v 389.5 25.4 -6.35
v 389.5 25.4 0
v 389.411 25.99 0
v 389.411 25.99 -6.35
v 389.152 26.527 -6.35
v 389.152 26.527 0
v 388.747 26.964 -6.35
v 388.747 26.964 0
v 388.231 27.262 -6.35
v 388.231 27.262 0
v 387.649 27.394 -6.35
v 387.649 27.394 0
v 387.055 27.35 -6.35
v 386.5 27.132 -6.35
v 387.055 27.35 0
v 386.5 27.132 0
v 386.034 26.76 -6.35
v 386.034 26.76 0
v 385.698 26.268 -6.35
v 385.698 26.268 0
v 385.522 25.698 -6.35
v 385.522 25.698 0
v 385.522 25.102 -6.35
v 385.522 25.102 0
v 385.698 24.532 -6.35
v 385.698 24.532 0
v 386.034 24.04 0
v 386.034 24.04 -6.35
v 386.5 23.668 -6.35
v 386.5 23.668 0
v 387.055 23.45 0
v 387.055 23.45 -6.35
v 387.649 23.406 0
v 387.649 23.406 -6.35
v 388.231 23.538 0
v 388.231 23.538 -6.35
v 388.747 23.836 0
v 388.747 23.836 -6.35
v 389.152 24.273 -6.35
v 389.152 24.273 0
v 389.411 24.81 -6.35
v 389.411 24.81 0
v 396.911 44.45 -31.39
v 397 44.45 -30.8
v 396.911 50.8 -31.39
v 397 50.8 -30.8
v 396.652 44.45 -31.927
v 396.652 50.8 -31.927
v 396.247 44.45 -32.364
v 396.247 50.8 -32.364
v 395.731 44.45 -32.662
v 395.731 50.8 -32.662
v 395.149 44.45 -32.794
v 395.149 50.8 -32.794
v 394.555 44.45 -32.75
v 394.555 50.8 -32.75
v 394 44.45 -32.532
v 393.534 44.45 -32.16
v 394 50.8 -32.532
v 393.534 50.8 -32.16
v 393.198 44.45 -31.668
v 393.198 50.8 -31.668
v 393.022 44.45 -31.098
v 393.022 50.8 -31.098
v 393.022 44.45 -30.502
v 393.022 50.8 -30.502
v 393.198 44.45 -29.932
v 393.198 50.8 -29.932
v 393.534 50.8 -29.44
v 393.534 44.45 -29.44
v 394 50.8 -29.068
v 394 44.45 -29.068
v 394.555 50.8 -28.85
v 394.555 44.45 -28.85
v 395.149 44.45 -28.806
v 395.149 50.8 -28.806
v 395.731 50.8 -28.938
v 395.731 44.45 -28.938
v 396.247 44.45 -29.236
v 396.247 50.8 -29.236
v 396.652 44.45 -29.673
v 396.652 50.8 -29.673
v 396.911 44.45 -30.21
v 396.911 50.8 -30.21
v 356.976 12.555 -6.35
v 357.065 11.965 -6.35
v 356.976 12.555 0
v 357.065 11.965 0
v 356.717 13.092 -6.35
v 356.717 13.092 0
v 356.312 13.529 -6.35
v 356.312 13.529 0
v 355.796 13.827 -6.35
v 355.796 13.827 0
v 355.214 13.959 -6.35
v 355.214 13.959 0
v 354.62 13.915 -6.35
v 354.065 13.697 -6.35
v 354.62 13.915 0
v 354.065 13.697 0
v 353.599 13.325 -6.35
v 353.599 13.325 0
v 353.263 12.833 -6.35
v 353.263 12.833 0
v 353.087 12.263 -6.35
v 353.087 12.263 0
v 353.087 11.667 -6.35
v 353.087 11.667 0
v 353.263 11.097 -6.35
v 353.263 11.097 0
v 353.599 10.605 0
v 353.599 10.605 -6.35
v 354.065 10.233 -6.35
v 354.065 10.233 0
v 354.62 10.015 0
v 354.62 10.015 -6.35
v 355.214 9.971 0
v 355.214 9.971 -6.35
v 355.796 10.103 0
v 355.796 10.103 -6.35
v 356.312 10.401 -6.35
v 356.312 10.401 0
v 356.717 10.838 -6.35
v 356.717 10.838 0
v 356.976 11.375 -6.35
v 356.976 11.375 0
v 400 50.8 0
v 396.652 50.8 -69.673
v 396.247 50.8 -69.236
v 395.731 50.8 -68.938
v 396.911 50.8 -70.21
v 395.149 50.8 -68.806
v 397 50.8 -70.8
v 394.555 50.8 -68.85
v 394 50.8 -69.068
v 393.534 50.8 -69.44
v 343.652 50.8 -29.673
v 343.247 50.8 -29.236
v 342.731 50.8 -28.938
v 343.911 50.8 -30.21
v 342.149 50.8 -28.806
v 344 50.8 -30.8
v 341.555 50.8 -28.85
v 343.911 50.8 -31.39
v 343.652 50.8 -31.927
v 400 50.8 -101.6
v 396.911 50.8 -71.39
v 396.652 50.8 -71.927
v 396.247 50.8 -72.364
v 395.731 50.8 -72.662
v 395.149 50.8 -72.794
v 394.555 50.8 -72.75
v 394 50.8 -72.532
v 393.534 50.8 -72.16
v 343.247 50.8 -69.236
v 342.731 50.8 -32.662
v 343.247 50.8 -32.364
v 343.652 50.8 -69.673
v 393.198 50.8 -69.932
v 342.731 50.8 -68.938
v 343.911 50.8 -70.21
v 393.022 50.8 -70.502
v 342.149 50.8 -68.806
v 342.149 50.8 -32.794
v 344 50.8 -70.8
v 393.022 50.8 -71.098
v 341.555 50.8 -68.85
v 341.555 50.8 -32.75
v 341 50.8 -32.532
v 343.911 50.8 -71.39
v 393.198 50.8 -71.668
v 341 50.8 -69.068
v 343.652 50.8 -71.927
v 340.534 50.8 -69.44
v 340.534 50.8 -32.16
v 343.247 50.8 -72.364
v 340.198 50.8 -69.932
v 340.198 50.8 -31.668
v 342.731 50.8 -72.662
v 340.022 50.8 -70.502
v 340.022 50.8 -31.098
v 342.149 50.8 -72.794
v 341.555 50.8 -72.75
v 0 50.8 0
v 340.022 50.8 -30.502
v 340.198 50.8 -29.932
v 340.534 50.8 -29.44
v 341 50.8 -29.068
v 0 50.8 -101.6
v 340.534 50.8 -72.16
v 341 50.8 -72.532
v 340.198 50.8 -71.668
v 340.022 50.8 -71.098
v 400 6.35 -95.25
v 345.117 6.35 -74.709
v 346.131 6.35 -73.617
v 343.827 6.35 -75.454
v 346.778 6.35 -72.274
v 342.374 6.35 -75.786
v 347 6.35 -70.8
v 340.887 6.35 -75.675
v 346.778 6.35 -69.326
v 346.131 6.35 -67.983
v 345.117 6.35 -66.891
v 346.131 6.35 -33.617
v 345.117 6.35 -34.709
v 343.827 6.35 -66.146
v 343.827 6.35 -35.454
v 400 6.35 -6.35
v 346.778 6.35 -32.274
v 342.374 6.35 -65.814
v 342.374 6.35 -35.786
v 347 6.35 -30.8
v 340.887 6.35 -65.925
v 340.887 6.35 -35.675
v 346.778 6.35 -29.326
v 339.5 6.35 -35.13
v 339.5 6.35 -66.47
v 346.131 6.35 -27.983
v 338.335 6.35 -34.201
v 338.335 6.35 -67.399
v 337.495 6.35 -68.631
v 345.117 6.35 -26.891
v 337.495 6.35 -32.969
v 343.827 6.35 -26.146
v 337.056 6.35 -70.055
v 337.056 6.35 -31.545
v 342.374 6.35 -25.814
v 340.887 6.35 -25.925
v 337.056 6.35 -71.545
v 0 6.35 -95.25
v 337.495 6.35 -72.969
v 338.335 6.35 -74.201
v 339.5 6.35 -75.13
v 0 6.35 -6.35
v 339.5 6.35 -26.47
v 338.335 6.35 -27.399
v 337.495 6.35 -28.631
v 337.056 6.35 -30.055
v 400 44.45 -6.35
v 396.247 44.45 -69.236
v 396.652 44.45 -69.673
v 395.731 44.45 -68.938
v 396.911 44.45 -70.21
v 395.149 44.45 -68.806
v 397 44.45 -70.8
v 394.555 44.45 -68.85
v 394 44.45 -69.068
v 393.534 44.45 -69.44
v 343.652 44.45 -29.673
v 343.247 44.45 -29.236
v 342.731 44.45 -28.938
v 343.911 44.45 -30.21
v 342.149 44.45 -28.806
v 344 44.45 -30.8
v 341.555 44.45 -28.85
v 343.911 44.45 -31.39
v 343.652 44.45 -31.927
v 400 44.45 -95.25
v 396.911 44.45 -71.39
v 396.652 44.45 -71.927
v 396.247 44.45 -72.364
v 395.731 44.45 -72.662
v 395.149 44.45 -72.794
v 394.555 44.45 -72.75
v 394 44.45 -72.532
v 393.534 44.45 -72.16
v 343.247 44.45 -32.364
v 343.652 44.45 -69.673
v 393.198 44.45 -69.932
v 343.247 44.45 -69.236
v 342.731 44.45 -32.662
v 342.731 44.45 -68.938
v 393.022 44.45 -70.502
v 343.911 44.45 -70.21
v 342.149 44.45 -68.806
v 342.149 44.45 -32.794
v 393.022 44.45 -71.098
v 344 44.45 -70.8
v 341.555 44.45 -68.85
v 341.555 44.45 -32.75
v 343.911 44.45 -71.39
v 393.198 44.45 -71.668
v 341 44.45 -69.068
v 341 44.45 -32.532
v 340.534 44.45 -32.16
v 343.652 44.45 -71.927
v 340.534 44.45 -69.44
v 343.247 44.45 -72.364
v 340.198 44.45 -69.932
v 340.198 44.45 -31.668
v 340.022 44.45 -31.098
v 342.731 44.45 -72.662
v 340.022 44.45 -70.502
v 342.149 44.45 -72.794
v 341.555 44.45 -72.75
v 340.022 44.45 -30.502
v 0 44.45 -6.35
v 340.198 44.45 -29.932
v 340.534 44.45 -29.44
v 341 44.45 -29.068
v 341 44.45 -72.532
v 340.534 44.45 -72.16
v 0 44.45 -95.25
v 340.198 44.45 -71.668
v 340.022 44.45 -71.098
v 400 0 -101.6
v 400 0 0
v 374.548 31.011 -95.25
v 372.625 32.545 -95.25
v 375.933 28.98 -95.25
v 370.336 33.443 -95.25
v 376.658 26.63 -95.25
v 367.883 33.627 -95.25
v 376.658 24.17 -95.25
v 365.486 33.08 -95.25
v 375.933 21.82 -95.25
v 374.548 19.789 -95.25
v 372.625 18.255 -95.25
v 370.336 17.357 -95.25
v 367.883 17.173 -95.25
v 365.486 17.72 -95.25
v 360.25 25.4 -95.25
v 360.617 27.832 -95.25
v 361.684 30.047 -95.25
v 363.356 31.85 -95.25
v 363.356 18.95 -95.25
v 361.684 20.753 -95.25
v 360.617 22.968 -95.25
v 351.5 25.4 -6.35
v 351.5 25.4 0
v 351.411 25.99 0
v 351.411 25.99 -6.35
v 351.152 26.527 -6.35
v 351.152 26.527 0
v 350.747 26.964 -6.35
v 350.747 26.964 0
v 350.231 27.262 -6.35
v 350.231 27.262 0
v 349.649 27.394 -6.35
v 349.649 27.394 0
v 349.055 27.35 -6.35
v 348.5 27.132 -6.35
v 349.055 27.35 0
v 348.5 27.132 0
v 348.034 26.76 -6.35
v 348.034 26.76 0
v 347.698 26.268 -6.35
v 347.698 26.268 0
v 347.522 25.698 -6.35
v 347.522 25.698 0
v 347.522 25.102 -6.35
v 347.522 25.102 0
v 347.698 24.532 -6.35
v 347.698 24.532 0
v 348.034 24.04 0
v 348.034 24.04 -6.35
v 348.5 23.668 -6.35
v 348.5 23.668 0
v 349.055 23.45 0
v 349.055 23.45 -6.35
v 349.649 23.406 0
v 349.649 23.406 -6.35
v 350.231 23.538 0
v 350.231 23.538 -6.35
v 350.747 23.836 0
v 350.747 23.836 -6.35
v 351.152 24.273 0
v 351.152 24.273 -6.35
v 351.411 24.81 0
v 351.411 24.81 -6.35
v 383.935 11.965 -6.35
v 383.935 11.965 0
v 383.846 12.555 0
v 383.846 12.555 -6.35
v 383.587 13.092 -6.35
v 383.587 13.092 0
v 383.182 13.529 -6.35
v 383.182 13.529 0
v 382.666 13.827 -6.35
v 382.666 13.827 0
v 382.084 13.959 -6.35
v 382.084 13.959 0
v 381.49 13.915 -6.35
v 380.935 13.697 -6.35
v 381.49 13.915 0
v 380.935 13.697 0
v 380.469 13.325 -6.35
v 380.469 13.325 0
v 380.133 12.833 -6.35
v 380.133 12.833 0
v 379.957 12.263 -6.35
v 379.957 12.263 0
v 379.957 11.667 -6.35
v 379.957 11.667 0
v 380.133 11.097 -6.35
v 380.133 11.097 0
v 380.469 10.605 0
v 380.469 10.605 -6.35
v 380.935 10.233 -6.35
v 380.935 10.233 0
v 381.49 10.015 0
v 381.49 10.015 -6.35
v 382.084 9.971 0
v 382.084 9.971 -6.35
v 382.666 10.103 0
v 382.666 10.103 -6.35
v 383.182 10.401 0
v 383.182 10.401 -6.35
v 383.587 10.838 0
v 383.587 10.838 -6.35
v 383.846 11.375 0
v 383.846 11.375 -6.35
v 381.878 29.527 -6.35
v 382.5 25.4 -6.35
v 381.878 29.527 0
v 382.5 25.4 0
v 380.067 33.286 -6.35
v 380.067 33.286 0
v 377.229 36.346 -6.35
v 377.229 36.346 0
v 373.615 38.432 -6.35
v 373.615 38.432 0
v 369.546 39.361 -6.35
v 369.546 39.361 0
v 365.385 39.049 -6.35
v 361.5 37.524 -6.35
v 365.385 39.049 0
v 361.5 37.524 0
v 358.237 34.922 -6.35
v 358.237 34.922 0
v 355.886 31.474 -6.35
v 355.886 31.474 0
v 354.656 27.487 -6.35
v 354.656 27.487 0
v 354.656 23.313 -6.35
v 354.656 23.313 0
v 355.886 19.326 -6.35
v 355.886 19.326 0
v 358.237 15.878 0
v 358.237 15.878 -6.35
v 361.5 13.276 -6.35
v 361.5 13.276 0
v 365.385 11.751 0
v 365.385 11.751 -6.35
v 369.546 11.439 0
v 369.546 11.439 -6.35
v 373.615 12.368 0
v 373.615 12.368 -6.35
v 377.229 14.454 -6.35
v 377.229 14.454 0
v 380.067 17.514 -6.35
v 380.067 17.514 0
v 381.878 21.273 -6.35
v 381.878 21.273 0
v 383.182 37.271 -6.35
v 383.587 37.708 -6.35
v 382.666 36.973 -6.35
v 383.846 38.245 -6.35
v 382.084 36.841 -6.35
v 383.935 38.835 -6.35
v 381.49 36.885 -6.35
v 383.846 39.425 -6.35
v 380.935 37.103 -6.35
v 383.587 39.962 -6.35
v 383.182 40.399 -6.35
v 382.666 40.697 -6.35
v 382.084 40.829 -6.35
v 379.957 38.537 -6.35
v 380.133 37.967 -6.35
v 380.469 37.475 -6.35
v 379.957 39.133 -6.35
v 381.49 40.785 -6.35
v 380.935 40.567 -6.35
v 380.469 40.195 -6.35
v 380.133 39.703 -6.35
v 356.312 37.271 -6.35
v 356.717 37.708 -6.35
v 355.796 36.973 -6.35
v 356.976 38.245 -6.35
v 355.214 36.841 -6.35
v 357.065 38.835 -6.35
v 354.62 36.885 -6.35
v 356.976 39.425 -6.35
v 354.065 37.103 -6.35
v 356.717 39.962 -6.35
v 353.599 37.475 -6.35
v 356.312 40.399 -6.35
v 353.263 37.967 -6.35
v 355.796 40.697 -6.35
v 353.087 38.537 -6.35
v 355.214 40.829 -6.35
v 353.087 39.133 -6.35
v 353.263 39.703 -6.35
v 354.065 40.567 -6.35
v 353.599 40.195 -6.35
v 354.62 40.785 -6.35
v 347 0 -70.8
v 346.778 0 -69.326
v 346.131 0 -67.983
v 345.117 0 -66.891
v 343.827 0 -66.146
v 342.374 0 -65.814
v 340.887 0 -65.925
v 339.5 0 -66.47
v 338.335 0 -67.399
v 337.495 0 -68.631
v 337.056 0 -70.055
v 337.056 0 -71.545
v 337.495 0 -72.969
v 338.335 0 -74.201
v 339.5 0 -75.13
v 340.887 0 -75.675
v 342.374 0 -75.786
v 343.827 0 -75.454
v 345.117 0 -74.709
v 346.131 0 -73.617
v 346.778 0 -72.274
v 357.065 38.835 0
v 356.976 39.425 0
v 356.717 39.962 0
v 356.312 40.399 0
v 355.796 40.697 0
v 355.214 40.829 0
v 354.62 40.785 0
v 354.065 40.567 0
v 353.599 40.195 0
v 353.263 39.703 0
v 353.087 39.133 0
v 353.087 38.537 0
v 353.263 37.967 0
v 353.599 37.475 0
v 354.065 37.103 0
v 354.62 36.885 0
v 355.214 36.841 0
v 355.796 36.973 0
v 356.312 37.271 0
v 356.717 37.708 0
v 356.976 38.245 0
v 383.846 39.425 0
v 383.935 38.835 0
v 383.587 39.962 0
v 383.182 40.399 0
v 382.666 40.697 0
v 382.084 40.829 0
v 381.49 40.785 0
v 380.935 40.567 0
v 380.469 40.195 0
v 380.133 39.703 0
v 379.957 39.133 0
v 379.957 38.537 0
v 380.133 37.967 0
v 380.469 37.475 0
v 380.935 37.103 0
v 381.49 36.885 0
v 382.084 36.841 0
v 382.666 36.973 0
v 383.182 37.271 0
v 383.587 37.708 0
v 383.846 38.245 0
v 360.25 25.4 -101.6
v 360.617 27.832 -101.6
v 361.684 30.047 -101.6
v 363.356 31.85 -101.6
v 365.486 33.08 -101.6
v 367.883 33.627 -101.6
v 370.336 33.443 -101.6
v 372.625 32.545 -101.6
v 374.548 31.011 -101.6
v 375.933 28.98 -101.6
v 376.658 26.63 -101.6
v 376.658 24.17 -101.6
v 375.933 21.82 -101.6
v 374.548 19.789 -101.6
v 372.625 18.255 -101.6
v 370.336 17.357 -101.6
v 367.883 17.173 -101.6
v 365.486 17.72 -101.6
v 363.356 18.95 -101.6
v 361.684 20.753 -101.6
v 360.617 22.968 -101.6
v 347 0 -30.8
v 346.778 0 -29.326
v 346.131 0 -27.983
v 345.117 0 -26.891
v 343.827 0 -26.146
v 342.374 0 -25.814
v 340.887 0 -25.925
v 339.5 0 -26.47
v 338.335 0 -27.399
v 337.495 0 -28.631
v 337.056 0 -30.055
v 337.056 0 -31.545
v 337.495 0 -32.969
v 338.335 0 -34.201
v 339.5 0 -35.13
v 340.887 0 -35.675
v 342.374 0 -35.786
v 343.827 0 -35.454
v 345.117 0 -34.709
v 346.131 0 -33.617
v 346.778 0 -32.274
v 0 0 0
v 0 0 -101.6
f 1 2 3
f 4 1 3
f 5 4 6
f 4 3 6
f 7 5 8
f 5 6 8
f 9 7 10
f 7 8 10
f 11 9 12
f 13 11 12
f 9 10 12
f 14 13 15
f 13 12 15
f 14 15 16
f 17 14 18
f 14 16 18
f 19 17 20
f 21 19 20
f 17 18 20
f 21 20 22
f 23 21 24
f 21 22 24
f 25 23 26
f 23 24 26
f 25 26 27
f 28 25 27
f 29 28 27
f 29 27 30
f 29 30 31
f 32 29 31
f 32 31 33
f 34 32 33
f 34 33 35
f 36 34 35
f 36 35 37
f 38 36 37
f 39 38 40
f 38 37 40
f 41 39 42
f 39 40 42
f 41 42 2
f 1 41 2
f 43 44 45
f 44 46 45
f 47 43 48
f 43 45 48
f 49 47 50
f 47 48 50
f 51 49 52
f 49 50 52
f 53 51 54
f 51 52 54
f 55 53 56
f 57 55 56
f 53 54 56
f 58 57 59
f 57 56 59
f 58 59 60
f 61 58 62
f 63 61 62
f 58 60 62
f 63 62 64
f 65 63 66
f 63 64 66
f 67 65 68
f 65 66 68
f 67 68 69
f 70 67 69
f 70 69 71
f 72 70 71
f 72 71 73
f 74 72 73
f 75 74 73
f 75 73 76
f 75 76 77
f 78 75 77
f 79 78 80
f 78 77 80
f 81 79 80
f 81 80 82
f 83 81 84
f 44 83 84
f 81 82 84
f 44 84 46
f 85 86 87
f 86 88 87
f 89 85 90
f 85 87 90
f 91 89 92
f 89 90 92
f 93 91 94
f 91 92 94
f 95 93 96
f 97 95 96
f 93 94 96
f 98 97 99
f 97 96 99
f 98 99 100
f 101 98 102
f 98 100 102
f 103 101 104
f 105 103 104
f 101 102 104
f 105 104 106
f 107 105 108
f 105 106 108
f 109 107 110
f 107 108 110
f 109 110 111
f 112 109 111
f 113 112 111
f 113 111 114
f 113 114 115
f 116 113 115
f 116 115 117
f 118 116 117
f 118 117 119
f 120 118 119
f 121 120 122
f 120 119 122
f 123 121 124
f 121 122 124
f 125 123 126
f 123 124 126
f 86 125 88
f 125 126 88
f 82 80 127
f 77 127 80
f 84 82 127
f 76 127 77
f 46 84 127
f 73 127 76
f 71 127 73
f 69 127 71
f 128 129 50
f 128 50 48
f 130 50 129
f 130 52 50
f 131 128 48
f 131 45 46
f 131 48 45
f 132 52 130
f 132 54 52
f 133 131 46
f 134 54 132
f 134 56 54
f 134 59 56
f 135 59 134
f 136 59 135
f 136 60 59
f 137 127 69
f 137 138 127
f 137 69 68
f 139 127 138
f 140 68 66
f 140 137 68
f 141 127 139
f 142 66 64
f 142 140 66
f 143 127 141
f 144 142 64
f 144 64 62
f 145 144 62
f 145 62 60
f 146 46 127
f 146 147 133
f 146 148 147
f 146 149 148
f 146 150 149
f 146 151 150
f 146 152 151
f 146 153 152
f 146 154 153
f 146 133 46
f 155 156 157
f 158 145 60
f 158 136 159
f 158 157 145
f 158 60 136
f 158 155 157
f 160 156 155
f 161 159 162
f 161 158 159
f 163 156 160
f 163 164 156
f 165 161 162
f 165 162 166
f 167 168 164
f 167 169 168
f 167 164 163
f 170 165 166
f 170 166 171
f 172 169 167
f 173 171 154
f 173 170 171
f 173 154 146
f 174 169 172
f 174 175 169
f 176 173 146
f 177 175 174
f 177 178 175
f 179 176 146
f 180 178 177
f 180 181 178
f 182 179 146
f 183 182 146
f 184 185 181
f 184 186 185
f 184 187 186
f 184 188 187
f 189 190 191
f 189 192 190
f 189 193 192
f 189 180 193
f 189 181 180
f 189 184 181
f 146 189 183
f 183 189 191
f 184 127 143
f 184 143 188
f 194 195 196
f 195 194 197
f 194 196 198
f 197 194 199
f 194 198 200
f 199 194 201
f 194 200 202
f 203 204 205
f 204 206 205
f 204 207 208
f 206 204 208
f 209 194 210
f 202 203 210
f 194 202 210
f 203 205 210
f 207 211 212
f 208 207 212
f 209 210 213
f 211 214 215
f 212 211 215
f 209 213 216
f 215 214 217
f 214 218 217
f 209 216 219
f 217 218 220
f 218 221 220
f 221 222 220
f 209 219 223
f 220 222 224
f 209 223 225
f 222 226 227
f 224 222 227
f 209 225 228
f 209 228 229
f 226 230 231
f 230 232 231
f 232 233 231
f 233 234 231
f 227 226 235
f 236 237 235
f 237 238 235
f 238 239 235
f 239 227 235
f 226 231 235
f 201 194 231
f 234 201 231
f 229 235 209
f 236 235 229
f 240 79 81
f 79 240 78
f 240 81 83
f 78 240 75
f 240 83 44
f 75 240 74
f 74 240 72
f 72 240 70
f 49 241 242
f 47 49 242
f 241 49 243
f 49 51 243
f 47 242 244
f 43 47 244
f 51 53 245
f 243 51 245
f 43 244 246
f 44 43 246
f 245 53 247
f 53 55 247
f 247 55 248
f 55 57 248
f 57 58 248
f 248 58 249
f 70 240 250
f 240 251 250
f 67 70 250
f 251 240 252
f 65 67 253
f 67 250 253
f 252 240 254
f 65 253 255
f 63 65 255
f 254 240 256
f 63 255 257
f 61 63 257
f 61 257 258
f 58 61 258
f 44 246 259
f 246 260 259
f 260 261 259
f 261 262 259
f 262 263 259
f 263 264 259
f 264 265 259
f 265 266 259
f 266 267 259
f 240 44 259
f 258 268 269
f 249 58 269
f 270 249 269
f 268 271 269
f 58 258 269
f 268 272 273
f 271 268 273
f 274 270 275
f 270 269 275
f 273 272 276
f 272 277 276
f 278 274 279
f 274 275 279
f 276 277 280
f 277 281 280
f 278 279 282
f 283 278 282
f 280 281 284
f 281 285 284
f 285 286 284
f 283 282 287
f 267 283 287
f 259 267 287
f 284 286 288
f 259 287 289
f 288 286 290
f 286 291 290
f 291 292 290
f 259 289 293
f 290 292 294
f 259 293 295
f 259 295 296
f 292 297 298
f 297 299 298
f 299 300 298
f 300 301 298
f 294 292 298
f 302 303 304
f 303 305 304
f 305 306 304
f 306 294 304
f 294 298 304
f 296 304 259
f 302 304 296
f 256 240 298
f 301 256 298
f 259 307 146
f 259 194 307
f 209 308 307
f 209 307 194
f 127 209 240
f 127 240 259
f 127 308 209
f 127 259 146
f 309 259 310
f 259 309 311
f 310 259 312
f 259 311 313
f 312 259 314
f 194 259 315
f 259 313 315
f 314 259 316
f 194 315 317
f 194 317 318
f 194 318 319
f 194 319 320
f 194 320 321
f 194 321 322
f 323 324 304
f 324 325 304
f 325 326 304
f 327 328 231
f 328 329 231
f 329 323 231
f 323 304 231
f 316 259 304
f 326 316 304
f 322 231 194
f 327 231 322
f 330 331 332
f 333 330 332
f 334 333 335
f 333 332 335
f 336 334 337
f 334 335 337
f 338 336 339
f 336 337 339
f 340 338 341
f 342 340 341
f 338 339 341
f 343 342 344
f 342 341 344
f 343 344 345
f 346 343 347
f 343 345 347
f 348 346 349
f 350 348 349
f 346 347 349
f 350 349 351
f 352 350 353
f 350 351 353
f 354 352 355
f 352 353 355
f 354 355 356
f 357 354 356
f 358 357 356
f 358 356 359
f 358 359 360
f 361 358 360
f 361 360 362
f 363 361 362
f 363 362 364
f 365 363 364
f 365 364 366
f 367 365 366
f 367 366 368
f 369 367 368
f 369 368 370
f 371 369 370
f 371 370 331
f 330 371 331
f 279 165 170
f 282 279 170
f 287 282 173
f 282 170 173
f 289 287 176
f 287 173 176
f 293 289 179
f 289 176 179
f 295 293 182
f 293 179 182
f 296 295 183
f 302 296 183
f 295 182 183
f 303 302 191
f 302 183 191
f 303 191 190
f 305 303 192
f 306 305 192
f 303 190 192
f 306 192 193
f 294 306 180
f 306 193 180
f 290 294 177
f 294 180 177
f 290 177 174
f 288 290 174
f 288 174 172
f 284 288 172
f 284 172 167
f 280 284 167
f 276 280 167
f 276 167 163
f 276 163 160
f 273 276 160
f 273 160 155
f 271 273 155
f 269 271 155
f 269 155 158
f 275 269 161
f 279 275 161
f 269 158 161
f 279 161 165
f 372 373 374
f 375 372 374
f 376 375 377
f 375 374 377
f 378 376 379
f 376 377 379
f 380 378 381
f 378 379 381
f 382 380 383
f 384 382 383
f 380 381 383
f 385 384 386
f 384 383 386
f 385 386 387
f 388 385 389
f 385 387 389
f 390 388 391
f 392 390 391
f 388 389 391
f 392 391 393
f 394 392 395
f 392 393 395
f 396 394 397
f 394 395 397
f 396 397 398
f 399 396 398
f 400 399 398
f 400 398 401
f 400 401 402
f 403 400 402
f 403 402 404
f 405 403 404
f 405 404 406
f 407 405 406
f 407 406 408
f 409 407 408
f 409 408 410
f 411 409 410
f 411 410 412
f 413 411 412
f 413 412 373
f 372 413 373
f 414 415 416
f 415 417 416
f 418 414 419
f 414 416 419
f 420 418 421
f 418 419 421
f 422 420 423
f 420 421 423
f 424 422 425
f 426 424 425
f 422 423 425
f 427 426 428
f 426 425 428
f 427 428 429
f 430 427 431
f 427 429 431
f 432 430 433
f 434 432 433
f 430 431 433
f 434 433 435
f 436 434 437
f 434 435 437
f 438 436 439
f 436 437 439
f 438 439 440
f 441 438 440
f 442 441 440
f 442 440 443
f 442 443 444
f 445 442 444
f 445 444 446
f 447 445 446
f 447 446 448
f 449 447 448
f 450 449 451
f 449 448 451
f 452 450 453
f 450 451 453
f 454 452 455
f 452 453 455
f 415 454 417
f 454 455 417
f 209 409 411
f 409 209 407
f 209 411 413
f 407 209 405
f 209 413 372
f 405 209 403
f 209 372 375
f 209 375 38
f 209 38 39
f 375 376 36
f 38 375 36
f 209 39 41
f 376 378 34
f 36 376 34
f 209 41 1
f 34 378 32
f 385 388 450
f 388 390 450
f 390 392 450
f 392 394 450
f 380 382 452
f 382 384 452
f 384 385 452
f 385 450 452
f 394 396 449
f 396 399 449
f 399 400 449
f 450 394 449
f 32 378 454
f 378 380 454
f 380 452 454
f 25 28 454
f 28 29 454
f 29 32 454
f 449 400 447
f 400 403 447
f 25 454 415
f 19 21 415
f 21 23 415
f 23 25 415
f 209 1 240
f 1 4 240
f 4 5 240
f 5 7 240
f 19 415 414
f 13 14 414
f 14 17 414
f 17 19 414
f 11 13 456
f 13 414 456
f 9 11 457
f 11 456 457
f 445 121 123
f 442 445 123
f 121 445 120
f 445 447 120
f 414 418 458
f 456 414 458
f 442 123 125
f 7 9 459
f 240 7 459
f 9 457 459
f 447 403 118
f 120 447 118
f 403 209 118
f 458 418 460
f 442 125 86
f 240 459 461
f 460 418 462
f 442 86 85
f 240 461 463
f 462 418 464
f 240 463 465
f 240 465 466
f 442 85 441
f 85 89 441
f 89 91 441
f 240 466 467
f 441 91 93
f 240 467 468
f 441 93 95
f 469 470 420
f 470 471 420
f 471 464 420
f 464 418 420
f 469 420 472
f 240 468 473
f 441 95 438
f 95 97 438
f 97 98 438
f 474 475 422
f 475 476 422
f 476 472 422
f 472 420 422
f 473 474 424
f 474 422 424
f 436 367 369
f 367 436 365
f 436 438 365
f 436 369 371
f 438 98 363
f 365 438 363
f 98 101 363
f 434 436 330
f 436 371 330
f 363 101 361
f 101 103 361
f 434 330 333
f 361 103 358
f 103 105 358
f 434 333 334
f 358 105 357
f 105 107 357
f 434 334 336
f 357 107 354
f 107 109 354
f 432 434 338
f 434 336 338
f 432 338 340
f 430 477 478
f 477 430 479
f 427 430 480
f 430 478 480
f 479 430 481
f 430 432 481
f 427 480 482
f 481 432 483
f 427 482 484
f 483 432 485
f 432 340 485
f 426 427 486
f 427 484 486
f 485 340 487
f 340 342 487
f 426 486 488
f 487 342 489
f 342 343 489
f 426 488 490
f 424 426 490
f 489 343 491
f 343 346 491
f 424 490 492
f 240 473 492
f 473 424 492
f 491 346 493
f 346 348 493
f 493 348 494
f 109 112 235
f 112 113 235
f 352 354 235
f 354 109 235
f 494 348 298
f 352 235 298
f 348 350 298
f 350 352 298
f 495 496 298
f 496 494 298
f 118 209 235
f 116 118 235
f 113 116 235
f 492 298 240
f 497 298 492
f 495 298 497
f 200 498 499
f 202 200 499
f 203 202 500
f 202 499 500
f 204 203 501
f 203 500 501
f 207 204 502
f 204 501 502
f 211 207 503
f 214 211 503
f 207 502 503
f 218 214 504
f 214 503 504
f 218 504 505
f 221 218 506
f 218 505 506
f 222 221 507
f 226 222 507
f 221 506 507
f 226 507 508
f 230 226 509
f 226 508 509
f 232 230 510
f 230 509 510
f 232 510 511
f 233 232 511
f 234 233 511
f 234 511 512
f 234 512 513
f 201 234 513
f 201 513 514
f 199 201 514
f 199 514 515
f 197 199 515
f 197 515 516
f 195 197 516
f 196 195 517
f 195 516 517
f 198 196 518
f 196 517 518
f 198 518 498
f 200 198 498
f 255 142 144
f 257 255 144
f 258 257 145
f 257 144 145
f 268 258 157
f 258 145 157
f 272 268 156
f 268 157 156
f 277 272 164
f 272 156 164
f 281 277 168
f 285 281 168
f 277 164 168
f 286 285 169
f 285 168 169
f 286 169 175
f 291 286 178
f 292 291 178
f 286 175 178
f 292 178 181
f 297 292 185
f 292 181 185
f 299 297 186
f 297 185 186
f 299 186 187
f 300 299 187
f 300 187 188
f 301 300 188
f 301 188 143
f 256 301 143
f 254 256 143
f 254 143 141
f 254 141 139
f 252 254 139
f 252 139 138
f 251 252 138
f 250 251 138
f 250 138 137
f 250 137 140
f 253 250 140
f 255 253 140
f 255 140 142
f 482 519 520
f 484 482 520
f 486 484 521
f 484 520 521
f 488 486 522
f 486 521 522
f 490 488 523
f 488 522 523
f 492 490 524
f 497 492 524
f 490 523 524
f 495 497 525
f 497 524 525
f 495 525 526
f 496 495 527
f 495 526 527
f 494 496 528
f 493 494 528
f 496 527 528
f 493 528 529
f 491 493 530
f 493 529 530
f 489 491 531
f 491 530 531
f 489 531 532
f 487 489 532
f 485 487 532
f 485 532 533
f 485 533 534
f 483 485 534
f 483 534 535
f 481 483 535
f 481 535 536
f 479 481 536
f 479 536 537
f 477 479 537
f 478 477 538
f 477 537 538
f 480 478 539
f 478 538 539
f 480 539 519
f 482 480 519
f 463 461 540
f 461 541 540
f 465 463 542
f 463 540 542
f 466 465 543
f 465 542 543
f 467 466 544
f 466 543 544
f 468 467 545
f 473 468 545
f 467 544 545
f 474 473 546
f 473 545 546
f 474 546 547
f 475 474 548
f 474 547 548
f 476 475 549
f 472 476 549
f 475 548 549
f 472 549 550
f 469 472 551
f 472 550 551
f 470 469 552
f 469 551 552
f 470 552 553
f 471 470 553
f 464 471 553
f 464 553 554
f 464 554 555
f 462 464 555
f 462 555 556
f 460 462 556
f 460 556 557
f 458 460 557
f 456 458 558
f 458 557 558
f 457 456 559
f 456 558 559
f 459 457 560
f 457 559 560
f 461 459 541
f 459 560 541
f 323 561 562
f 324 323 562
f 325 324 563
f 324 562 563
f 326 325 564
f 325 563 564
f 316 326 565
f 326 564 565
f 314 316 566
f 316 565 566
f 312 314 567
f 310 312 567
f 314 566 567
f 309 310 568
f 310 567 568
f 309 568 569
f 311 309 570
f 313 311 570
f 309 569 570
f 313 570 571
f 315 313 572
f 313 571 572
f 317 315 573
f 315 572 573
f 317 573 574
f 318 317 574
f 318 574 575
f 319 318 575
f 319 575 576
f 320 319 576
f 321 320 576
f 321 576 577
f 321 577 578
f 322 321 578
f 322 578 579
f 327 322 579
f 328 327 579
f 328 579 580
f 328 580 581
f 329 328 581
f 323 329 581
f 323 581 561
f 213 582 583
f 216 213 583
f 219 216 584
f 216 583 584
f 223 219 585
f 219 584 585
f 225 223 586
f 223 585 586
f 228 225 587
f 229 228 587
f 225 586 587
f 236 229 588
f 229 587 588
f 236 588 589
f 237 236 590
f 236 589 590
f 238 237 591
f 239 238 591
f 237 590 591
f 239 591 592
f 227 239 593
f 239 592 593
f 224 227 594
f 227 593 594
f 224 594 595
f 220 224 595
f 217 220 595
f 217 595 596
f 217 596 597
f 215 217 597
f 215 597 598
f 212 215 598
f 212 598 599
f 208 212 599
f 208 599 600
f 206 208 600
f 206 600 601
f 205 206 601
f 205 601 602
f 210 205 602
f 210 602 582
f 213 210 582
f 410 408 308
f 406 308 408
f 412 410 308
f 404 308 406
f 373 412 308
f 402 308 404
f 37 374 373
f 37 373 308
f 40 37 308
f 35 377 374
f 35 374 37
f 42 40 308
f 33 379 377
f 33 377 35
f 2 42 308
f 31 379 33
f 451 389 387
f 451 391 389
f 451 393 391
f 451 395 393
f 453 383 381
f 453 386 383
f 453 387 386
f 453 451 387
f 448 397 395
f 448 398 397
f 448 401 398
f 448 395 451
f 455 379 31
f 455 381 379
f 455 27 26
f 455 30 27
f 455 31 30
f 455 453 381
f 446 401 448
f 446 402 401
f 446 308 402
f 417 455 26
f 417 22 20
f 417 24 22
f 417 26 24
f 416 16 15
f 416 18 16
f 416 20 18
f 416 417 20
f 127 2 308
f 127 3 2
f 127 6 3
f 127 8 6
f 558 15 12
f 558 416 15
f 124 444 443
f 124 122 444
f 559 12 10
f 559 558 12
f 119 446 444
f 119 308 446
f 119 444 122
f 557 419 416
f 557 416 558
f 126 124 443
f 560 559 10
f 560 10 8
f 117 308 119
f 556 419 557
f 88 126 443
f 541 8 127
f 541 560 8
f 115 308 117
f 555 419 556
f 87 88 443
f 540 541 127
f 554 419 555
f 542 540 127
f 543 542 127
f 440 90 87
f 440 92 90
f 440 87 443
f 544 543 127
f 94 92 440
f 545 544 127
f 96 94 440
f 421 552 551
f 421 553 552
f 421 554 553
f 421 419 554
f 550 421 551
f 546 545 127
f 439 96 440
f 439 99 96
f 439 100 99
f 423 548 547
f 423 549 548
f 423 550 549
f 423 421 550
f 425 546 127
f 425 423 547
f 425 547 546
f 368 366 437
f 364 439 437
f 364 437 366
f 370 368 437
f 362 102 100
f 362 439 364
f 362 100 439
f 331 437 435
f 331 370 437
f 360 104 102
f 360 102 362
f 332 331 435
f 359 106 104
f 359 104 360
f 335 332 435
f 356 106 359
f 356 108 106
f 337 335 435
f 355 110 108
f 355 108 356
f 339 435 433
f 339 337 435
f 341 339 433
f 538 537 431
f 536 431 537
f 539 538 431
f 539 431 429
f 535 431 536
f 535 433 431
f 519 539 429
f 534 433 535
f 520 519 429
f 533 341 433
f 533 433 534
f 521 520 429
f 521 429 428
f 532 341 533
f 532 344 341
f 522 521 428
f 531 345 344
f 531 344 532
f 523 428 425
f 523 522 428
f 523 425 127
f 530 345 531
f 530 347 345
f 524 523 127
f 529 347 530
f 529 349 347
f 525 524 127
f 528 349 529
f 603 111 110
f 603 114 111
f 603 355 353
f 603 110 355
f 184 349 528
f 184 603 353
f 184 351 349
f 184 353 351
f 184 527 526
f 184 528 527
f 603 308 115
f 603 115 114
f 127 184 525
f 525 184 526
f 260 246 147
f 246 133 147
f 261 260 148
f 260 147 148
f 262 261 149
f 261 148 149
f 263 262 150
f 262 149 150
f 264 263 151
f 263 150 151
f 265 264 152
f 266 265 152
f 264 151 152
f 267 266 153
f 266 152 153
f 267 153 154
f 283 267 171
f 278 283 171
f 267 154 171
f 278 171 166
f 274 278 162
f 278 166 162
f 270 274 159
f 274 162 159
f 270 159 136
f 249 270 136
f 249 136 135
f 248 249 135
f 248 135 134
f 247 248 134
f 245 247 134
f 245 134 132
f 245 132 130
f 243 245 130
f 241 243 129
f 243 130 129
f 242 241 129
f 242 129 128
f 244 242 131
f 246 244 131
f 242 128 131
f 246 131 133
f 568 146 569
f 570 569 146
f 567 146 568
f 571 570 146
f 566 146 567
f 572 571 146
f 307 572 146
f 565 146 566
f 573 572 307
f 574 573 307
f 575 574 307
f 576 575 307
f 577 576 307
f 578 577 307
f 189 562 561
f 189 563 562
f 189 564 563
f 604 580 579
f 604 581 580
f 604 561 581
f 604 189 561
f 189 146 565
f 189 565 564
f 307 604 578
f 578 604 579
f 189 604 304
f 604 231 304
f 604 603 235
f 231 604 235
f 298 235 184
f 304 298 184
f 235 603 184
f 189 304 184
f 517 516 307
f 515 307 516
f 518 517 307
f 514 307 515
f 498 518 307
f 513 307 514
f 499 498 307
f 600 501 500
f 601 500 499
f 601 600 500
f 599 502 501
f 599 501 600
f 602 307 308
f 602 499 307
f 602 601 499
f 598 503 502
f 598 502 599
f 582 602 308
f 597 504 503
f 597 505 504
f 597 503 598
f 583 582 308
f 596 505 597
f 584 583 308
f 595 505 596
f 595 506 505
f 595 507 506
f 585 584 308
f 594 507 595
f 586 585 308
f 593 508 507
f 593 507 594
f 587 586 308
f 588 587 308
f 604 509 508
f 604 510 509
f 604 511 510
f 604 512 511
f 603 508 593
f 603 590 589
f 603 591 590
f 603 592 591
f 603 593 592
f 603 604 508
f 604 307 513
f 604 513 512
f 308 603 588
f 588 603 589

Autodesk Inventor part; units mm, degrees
ref_plane "YZ Plane" through (0, 0, 0) normal (1, 0, 0) x (0, 1, 0)
ref_plane "XZ Plane" through (0, 0, 0) normal (0, 1, 0) x (-1, 0, 0)
ref_plane "XY Plane" through (0, 0, 0) normal (0, 0, 1) x (1, 0, 0)
sketch "Sketch1" plane through (0, 0, 0) normal (1, 0, 0) x (0, 1, 0)
  line L0 (0, 0) -> (50.8, 0)
  line L1 (50.8, 0) -> (50.8, -101.6)
  line L2 (50.8, -101.6) -> (0, -101.6)
  line L3 (0, -101.6) -> (0, 0)
  dimension "d0" = 101.6
  dimension "d1" = 50.8
extrude "Extrusion1" add sketch "Sketch1" along normal blind 400
shell "Shell1" thickness 6.35 removed faces 2 at (0, 16.9333, -33.8667) at (400, 16.9333, -33.8667)
sketch "Sketch2" plane through (0, 50.8, 0) normal (0, 1, 0) x (1, 0, 0)
  circle A0 centre (395, 70.8) radius 2
  circle A1 centre (395, 30.8) radius 2
  circle A2 centre (342, 70.8) radius 2
  circle A3 centre (342, 30.8) radius 2
  line L0 (395, 70.8) -> (342, 70.8) construction
  line L1 (342, 70.8) -> (342, 30.8) construction
  line L2 (342, 30.8) -> (395, 30.8) construction
  line L3 (395, 30.8) -> (395, 70.8) construction
  line L4 (400, 101.6) -> (400, 0) projected
  line L5 (337, 101.6) -> (337, 0)
  line L6 (337, 0) -> (400, 0)
  line L7 (400, 101.6) -> (337, 101.6)
  point P0 (368.5, 0)
  point P1 (368.5, 30.8)
  point P2 (395, 50.8)
  point P3 (400, 50.8)
  dimension "d5" = 4
  dimension "d6" = 63
  dimension "d7" = 40
  dimension "d8" = 53
extrude "Extrusion2" cut sketch "Sketch2" against normal up to surface (6.35 mm away) contours A0 | A1 | A2 | A3
sketch "Sketch3" plane through (0, 0, 0) normal (0, 0, 1) x (1, 0, 0)
  line L0 (397, 44.45) -> (393, 44.45) construction
  line L1 (344, 44.45) -> (340, 44.45) construction
  circle A0 centre (368.5, 25.4) radius 19 construction
  line L2 (400, 50.8) -> (400, 0) construction
  line L3 (393, 44.45) -> (368.5, 25.4) construction
  line L4 (368.5, 25.4) -> (344, 44.45) construction
  circle A1 centre (355.065, 11.965) radius 2
  circle A2 centre (381.935, 11.965) radius 2
  circle A3 centre (381.935, 38.835) radius 2
  circle A4 centre (387.5, 25.4) radius 2
  circle A5 centre (355.065, 38.835) radius 2
  circle A6 centre (349.5, 25.4) radius 2
  line L5 (349.5, 25.4) -> (368.5, 25.4) construction
  line L6 (355.065, 11.965) -> (368.5, 25.4) construction
  circle A7 centre (368.5, 25.4) radius 14
  point P0 (0, 0)
  point P1 (400, 25.4)
  point P2 (400, 25.4)
  dimension "d11" = 38
  dimension "d12" = 4
  dimension "d13" = 45
  dimension "d14" = 28
extrude "Extrusion3" cut sketch "Sketch3" against normal up to surface (6.35 mm away)
sketch "Sketch4" plane through (0, 0, -101.6) normal (0, 0, -1) x (-1, 0, 0)
  circle A0 centre (-368.5, 25.4) radius 14 construction
  circle A1 centre (-368.5, 25.4) radius 8.25
  point P0 (0, 0)
  dimension "d17" = 16.5
extrude "Extrusion4" cut sketch "Sketch4" against normal up to surface (6.35 mm away)
sketch "Sketch5" plane through (0, 0, -101.6) normal (0, -1, 0) x (1, 0, 0)
  circle A0 centre (342, 30.8) radius 2 projected
  circle A1 centre (342, 70.8) radius 2 projected
  circle A2 centre (342, 30.8) radius 5
  circle A3 centre (342, 70.8) radius 5
  point P0 (0, 101.6)
  dimension "d20" = 10
extrude "Extrusion5" cut sketch "Sketch5" against normal up to surface (6.35 mm away) contours A0 | A1 | A2 | A3
properties part number "VERTICALTUBE"
